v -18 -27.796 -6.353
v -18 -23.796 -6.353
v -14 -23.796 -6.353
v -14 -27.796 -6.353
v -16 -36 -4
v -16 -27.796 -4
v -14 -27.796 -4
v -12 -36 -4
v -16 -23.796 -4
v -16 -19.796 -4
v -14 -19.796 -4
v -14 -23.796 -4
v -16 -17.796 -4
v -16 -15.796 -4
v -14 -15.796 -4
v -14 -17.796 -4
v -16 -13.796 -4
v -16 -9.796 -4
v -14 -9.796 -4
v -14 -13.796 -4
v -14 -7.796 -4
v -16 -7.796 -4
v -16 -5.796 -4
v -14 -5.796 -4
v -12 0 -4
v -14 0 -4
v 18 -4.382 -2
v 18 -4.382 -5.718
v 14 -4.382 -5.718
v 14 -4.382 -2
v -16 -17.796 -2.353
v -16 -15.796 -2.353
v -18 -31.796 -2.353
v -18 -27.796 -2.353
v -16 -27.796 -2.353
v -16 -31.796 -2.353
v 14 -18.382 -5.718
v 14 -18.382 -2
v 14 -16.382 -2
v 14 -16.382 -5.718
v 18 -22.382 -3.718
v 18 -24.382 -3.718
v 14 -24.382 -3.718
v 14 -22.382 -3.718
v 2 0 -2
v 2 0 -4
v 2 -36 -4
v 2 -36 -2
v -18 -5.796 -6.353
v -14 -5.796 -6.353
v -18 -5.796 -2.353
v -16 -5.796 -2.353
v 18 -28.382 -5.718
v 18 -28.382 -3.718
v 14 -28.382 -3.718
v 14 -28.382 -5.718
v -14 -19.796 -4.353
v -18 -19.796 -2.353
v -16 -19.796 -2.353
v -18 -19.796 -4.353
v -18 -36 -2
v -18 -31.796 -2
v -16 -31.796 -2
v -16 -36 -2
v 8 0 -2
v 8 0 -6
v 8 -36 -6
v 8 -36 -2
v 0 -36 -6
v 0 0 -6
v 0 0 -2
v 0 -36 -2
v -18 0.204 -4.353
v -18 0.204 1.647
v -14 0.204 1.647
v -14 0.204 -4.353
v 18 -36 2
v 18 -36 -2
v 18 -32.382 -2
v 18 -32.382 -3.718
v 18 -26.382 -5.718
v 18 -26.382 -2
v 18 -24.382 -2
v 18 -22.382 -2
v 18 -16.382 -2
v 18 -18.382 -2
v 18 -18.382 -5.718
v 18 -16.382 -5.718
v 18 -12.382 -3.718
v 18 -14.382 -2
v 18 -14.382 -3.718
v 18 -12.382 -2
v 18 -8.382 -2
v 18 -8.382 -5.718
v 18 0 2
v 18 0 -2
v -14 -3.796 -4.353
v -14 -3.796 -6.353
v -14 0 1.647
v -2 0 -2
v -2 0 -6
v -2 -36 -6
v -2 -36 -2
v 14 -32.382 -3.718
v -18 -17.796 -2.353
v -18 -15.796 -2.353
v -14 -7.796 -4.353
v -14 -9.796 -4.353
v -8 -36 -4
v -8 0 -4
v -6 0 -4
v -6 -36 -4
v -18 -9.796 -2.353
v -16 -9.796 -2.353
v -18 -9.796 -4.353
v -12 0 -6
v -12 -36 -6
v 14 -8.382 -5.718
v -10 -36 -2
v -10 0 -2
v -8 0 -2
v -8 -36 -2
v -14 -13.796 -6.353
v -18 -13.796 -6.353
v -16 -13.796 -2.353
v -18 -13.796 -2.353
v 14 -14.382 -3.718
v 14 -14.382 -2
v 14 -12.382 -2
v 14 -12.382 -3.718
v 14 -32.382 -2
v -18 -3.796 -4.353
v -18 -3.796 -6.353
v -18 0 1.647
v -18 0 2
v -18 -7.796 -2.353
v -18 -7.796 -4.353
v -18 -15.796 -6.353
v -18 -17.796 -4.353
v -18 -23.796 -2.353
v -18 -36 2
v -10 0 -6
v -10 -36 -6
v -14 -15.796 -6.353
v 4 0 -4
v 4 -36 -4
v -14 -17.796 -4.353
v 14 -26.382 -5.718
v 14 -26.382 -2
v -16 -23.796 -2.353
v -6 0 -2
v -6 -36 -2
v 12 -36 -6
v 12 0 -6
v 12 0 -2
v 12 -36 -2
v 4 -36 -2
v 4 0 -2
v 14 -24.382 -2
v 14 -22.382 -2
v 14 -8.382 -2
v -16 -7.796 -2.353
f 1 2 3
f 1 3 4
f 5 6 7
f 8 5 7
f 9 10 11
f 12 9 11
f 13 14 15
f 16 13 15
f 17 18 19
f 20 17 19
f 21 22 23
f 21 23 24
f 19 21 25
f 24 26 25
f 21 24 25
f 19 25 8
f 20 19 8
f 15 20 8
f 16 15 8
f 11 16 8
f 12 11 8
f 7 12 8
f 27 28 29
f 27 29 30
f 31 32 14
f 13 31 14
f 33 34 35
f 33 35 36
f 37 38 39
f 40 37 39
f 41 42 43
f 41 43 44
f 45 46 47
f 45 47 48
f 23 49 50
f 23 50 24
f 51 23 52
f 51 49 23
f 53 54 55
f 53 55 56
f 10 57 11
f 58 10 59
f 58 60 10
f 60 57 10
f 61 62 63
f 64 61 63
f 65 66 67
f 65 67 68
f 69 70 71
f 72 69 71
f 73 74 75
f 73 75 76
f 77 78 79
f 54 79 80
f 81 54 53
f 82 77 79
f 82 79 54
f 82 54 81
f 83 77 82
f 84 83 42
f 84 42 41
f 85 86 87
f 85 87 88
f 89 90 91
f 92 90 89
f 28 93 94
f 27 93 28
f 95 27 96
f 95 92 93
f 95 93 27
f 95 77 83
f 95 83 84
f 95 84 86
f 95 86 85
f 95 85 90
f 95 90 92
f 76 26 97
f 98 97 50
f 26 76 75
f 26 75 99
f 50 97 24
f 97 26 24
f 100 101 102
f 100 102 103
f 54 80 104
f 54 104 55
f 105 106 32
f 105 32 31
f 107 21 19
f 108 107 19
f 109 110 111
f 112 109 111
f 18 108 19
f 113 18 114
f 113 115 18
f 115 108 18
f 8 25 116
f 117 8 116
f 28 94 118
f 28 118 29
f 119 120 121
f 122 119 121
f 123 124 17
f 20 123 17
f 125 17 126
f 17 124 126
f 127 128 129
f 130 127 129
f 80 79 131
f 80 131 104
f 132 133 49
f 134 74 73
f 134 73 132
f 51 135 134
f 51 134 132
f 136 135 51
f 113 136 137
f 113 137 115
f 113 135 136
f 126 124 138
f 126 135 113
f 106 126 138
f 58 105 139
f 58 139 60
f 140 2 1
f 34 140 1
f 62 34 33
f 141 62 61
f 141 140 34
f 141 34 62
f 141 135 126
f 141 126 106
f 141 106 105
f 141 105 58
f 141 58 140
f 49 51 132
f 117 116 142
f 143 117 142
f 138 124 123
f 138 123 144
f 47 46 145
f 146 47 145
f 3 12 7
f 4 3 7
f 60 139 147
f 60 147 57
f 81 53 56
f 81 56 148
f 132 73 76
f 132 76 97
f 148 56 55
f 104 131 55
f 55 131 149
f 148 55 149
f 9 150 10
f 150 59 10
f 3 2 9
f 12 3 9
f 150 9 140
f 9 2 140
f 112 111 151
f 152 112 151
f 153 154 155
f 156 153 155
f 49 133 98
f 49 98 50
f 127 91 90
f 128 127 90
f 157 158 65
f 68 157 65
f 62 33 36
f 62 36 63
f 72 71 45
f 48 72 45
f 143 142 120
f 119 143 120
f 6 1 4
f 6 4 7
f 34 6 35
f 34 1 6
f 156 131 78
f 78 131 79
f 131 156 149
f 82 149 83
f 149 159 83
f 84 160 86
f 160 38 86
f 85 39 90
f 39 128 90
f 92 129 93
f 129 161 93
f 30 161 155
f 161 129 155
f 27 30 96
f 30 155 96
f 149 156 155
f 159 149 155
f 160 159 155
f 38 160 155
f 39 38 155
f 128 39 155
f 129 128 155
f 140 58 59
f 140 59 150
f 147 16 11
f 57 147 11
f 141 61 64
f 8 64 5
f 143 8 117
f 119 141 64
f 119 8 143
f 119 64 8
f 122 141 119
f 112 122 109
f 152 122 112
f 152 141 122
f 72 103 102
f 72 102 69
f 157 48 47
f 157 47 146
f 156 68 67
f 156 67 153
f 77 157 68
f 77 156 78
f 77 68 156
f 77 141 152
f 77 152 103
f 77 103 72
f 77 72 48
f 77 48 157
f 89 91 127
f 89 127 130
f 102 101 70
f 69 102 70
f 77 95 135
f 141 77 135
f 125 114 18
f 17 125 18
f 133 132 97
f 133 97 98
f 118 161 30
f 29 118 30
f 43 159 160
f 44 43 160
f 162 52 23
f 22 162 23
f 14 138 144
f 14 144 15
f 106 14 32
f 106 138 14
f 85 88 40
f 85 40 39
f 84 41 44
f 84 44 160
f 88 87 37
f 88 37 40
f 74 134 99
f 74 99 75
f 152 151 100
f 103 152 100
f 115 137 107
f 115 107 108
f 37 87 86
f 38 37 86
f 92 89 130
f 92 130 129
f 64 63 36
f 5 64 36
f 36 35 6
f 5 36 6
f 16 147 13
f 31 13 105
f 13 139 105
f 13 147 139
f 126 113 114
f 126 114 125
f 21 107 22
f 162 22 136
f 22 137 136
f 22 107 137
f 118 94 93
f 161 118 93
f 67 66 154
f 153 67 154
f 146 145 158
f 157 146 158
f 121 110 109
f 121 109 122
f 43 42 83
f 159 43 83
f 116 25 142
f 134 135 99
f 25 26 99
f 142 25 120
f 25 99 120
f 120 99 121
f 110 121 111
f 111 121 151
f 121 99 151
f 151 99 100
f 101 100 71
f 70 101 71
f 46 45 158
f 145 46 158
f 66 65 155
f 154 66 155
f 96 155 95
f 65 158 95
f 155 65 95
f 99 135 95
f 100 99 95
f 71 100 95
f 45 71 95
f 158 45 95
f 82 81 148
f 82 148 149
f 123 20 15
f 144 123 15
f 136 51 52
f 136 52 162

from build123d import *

# Parameters (mm, degrees)
F0_W     = 4
F0_H     = 4
F0_W_2   = 2
F0_H_2   = 2
F1_DEPTH = 36
F2_W     = 4
F2_H     = 4
F2_W_2   = 2
F2_H_2   = 2
F3_DEPTH = 4
F4_W     = 4
F4_H     = 4
F4_W_2   = 2
F4_H_2   = 2
F5_DEPTH = 4


with BuildPart() as f1:
    # F0 (on Front) → F1 (new body)
    with BuildSketch(Plane.XZ):
        Polygon((16, -2), (18, -2), (18, 2), (-18, 2), (-18, -2), (-16, -2), (-10, -2), (-8, -2), (-6, -2), (-2, -2), (0, -2), (2, -2), (4, -2), (8, -2), (12, -2), align=None)
        with Locations((10, -4)):
            Rectangle(F0_W, F0_H)
        with Locations((3, -3)):
            Rectangle(F0_W_2, F0_H_2)
        Polygon((-10, -2), (-16, -2), (-16, -4), (-12, -4), (-12, -6), (-10, -6), align=None)
        with Locations((-1, -4)):
            Rectangle(F0_W_2, F0_H)
        with Locations((-7, -3)):
            Rectangle(F0_W_2, F0_H_2)
    extrude(amount=F1_DEPTH)

    # F2 (on face) → F3 (join)
    with BuildSketch(Plane.YZ.offset(18)):
        with Locations((-6.381626, -3.717597)):
            Rectangle(F2_W, F2_H)
        Polygon((-26.381626, -5.717597), (-26.381626, -1.717597), (-32.381626, -1.717597), (-32.381626, -3.717597), (-28.381626, -3.717597), (-28.381626, -5.717597), align=None)
        with Locations((-23.381626, -2.717597)):
            Rectangle(F2_W_2, F2_H_2)
        with Locations((-17.381626, -3.717597)):
            Rectangle(F2_W_2, F2_H)
        with Locations((-13.381626, -2.717597)):
            Rectangle(F2_W_2, F2_H_2)
    extrude(amount=-F3_DEPTH)

    # F4 (on face) → F5 (join)
    with BuildSketch(Plane(origin=(-18, 0, 0), x_dir=(0, -1, 0), z_dir=(-1, 0, 0))):
        Polygon((27.795796, -2.352679), (31.795796, -2.352679), (31.795796, 1.647321), (-0.204204, 1.647321), (-0.204204, -2.352679), (5.795796, -2.352679), (7.795796, -2.352679), (9.795796, -2.352679), (13.795796, -2.352679), (15.795796, -2.352679), (17.795796, -2.352679), (19.795796, -2.352679), (23.795796, -2.352679), align=None)
        with Locations((25.795796, -4.352679)):
            Rectangle(F4_W, F4_H)
        with Locations((18.795796, -3.352679)):
            Rectangle(F4_W_2, F4_H_2)
        Polygon((5.795796, -2.352679), (-0.204204, -2.352679), (-0.204204, -4.352679), (3.795796, -4.352679), (3.795796, -6.352679), (5.795796, -6.352679), align=None)
        with Locations((14.795796, -4.352679)):
            Rectangle(F4_W_2, F4_H)
        with Locations((8.795796, -3.352679)):
            Rectangle(F4_W_2, F4_H_2)
    extrude(amount=-F5_DEPTH)


solid = f1.part
